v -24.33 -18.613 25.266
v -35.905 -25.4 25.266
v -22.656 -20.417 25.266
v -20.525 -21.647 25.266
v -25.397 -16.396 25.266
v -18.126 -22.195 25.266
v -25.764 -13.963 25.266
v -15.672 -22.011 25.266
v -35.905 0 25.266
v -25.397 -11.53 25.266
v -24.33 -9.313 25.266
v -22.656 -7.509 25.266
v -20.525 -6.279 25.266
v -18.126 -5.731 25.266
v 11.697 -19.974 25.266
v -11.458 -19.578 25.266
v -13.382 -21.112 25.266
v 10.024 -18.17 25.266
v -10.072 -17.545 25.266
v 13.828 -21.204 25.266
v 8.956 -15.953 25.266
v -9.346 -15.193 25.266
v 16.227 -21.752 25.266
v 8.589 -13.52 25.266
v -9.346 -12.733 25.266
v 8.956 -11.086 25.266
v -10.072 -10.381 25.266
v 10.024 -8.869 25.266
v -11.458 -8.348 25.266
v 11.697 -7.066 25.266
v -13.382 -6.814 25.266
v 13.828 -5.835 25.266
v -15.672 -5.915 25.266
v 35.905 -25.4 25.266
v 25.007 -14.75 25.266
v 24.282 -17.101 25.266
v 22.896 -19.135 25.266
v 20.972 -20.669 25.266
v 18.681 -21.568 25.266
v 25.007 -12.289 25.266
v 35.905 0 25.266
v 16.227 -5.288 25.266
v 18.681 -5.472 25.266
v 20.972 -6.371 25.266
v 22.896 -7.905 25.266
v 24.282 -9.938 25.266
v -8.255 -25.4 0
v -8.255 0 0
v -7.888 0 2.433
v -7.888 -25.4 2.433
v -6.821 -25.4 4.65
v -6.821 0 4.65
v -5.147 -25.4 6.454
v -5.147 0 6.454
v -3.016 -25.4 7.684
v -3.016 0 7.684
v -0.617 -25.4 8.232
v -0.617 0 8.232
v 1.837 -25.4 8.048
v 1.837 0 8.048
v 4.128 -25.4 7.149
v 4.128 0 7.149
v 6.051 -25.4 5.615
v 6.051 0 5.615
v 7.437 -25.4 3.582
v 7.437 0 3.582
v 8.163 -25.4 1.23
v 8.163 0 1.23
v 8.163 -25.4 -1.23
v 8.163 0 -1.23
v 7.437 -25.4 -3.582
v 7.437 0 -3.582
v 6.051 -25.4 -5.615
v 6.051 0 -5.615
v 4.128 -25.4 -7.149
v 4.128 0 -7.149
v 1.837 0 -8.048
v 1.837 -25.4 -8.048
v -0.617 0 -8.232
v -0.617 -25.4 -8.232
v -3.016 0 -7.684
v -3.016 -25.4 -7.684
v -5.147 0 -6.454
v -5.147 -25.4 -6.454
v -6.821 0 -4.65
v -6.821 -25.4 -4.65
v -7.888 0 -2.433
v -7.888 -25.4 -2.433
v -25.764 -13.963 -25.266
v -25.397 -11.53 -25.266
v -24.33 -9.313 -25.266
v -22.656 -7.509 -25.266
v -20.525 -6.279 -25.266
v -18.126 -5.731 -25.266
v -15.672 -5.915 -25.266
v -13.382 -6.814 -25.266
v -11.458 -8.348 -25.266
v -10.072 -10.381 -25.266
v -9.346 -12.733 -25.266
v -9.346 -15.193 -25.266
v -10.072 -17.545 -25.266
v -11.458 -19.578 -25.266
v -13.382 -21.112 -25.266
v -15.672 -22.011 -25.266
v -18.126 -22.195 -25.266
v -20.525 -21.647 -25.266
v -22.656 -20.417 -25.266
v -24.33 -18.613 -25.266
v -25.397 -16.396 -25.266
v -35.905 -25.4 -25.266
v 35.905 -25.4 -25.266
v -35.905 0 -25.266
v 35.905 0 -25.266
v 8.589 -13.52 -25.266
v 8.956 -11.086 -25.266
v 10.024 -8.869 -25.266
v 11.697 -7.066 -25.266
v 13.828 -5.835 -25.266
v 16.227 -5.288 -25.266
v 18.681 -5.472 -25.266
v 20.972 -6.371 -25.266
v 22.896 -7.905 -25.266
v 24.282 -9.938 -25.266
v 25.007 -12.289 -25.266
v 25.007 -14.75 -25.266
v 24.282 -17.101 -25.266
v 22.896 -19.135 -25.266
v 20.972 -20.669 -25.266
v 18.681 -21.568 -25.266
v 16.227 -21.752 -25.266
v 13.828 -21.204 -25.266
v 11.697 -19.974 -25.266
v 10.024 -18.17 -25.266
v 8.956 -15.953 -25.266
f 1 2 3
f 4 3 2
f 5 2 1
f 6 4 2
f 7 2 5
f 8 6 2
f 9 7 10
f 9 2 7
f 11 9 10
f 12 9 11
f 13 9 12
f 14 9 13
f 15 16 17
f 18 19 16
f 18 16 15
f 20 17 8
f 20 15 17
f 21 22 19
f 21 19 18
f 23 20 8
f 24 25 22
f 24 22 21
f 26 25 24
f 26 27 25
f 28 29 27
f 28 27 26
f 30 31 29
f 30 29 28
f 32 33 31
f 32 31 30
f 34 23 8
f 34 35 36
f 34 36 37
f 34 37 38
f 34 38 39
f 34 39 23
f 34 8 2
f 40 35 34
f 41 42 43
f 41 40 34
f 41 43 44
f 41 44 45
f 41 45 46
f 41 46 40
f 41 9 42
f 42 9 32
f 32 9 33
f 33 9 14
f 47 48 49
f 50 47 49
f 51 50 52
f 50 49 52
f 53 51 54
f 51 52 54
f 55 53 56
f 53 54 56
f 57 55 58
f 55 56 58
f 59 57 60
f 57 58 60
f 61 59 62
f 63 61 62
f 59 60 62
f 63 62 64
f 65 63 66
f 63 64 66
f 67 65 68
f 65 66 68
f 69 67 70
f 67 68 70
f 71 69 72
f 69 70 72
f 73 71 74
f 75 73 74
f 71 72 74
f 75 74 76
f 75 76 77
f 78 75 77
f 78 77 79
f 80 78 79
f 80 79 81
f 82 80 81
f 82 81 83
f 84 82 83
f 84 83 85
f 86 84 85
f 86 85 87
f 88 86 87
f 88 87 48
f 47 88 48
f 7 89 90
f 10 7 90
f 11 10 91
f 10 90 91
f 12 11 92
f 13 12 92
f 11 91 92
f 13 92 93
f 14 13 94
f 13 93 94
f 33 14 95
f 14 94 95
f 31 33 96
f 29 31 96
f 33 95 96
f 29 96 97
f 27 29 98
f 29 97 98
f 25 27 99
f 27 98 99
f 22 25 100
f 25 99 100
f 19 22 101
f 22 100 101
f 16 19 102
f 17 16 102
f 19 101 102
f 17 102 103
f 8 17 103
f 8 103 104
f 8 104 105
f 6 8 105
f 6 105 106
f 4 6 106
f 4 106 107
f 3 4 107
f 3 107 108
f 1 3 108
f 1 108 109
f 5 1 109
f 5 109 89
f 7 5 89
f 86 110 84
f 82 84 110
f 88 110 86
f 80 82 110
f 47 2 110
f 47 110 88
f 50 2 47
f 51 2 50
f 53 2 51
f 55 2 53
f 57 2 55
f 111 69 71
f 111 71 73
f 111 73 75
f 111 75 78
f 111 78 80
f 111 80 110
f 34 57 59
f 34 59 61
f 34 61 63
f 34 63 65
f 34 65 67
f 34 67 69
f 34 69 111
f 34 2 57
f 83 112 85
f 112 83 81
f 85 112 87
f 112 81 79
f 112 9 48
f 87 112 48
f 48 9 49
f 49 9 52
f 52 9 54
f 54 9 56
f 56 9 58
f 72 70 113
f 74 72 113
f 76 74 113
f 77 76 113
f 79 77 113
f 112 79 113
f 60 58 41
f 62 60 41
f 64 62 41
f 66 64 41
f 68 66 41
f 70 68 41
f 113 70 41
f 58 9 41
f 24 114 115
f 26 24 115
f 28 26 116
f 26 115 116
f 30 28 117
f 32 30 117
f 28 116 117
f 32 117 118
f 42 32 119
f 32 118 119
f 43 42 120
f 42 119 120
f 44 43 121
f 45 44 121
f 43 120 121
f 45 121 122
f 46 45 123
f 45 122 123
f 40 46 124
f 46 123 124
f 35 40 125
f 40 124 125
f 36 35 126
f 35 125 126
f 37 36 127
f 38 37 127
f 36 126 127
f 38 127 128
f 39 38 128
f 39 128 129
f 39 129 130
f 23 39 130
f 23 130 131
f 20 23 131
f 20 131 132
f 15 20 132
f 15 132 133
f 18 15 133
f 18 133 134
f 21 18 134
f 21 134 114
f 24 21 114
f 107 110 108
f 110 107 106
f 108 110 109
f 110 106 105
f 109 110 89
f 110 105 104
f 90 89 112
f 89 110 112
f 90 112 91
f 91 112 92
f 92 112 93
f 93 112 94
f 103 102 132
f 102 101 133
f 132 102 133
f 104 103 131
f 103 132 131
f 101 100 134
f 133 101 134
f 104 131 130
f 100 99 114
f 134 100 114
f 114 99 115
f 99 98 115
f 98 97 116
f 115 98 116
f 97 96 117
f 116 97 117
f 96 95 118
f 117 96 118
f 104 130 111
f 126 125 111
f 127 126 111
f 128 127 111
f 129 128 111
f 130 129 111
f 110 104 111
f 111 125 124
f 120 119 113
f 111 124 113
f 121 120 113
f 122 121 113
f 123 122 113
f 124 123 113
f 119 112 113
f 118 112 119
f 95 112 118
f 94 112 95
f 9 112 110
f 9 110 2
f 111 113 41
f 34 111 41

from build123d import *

# Parameters (mm, degrees)
F0_W     = 71.80953
F0_H     = 50.532632
F1_DEPTH = 25.4
F3_D     = 16.51
F5_D     = 16.51


with BuildPart() as f1:
    # F0 (on Front) → F1 (new body)
    with BuildSketch(Plane.XZ):
        Rectangle(F0_W, F0_H)
    extrude(amount=F1_DEPTH)

    # F3 (through all)
    with Locations(Plane.XZ.offset(25.4)):
        with Locations((0, 0)):
            Hole(F3_D / 2)

    # F5 (through all)
    with Locations(Plane.XY.offset(25.266316)):
        with Locations((-17.509114, -13.962964), (16.844211, -13.519696)):
            Hole(F5_D / 2)


solid = f1.part
